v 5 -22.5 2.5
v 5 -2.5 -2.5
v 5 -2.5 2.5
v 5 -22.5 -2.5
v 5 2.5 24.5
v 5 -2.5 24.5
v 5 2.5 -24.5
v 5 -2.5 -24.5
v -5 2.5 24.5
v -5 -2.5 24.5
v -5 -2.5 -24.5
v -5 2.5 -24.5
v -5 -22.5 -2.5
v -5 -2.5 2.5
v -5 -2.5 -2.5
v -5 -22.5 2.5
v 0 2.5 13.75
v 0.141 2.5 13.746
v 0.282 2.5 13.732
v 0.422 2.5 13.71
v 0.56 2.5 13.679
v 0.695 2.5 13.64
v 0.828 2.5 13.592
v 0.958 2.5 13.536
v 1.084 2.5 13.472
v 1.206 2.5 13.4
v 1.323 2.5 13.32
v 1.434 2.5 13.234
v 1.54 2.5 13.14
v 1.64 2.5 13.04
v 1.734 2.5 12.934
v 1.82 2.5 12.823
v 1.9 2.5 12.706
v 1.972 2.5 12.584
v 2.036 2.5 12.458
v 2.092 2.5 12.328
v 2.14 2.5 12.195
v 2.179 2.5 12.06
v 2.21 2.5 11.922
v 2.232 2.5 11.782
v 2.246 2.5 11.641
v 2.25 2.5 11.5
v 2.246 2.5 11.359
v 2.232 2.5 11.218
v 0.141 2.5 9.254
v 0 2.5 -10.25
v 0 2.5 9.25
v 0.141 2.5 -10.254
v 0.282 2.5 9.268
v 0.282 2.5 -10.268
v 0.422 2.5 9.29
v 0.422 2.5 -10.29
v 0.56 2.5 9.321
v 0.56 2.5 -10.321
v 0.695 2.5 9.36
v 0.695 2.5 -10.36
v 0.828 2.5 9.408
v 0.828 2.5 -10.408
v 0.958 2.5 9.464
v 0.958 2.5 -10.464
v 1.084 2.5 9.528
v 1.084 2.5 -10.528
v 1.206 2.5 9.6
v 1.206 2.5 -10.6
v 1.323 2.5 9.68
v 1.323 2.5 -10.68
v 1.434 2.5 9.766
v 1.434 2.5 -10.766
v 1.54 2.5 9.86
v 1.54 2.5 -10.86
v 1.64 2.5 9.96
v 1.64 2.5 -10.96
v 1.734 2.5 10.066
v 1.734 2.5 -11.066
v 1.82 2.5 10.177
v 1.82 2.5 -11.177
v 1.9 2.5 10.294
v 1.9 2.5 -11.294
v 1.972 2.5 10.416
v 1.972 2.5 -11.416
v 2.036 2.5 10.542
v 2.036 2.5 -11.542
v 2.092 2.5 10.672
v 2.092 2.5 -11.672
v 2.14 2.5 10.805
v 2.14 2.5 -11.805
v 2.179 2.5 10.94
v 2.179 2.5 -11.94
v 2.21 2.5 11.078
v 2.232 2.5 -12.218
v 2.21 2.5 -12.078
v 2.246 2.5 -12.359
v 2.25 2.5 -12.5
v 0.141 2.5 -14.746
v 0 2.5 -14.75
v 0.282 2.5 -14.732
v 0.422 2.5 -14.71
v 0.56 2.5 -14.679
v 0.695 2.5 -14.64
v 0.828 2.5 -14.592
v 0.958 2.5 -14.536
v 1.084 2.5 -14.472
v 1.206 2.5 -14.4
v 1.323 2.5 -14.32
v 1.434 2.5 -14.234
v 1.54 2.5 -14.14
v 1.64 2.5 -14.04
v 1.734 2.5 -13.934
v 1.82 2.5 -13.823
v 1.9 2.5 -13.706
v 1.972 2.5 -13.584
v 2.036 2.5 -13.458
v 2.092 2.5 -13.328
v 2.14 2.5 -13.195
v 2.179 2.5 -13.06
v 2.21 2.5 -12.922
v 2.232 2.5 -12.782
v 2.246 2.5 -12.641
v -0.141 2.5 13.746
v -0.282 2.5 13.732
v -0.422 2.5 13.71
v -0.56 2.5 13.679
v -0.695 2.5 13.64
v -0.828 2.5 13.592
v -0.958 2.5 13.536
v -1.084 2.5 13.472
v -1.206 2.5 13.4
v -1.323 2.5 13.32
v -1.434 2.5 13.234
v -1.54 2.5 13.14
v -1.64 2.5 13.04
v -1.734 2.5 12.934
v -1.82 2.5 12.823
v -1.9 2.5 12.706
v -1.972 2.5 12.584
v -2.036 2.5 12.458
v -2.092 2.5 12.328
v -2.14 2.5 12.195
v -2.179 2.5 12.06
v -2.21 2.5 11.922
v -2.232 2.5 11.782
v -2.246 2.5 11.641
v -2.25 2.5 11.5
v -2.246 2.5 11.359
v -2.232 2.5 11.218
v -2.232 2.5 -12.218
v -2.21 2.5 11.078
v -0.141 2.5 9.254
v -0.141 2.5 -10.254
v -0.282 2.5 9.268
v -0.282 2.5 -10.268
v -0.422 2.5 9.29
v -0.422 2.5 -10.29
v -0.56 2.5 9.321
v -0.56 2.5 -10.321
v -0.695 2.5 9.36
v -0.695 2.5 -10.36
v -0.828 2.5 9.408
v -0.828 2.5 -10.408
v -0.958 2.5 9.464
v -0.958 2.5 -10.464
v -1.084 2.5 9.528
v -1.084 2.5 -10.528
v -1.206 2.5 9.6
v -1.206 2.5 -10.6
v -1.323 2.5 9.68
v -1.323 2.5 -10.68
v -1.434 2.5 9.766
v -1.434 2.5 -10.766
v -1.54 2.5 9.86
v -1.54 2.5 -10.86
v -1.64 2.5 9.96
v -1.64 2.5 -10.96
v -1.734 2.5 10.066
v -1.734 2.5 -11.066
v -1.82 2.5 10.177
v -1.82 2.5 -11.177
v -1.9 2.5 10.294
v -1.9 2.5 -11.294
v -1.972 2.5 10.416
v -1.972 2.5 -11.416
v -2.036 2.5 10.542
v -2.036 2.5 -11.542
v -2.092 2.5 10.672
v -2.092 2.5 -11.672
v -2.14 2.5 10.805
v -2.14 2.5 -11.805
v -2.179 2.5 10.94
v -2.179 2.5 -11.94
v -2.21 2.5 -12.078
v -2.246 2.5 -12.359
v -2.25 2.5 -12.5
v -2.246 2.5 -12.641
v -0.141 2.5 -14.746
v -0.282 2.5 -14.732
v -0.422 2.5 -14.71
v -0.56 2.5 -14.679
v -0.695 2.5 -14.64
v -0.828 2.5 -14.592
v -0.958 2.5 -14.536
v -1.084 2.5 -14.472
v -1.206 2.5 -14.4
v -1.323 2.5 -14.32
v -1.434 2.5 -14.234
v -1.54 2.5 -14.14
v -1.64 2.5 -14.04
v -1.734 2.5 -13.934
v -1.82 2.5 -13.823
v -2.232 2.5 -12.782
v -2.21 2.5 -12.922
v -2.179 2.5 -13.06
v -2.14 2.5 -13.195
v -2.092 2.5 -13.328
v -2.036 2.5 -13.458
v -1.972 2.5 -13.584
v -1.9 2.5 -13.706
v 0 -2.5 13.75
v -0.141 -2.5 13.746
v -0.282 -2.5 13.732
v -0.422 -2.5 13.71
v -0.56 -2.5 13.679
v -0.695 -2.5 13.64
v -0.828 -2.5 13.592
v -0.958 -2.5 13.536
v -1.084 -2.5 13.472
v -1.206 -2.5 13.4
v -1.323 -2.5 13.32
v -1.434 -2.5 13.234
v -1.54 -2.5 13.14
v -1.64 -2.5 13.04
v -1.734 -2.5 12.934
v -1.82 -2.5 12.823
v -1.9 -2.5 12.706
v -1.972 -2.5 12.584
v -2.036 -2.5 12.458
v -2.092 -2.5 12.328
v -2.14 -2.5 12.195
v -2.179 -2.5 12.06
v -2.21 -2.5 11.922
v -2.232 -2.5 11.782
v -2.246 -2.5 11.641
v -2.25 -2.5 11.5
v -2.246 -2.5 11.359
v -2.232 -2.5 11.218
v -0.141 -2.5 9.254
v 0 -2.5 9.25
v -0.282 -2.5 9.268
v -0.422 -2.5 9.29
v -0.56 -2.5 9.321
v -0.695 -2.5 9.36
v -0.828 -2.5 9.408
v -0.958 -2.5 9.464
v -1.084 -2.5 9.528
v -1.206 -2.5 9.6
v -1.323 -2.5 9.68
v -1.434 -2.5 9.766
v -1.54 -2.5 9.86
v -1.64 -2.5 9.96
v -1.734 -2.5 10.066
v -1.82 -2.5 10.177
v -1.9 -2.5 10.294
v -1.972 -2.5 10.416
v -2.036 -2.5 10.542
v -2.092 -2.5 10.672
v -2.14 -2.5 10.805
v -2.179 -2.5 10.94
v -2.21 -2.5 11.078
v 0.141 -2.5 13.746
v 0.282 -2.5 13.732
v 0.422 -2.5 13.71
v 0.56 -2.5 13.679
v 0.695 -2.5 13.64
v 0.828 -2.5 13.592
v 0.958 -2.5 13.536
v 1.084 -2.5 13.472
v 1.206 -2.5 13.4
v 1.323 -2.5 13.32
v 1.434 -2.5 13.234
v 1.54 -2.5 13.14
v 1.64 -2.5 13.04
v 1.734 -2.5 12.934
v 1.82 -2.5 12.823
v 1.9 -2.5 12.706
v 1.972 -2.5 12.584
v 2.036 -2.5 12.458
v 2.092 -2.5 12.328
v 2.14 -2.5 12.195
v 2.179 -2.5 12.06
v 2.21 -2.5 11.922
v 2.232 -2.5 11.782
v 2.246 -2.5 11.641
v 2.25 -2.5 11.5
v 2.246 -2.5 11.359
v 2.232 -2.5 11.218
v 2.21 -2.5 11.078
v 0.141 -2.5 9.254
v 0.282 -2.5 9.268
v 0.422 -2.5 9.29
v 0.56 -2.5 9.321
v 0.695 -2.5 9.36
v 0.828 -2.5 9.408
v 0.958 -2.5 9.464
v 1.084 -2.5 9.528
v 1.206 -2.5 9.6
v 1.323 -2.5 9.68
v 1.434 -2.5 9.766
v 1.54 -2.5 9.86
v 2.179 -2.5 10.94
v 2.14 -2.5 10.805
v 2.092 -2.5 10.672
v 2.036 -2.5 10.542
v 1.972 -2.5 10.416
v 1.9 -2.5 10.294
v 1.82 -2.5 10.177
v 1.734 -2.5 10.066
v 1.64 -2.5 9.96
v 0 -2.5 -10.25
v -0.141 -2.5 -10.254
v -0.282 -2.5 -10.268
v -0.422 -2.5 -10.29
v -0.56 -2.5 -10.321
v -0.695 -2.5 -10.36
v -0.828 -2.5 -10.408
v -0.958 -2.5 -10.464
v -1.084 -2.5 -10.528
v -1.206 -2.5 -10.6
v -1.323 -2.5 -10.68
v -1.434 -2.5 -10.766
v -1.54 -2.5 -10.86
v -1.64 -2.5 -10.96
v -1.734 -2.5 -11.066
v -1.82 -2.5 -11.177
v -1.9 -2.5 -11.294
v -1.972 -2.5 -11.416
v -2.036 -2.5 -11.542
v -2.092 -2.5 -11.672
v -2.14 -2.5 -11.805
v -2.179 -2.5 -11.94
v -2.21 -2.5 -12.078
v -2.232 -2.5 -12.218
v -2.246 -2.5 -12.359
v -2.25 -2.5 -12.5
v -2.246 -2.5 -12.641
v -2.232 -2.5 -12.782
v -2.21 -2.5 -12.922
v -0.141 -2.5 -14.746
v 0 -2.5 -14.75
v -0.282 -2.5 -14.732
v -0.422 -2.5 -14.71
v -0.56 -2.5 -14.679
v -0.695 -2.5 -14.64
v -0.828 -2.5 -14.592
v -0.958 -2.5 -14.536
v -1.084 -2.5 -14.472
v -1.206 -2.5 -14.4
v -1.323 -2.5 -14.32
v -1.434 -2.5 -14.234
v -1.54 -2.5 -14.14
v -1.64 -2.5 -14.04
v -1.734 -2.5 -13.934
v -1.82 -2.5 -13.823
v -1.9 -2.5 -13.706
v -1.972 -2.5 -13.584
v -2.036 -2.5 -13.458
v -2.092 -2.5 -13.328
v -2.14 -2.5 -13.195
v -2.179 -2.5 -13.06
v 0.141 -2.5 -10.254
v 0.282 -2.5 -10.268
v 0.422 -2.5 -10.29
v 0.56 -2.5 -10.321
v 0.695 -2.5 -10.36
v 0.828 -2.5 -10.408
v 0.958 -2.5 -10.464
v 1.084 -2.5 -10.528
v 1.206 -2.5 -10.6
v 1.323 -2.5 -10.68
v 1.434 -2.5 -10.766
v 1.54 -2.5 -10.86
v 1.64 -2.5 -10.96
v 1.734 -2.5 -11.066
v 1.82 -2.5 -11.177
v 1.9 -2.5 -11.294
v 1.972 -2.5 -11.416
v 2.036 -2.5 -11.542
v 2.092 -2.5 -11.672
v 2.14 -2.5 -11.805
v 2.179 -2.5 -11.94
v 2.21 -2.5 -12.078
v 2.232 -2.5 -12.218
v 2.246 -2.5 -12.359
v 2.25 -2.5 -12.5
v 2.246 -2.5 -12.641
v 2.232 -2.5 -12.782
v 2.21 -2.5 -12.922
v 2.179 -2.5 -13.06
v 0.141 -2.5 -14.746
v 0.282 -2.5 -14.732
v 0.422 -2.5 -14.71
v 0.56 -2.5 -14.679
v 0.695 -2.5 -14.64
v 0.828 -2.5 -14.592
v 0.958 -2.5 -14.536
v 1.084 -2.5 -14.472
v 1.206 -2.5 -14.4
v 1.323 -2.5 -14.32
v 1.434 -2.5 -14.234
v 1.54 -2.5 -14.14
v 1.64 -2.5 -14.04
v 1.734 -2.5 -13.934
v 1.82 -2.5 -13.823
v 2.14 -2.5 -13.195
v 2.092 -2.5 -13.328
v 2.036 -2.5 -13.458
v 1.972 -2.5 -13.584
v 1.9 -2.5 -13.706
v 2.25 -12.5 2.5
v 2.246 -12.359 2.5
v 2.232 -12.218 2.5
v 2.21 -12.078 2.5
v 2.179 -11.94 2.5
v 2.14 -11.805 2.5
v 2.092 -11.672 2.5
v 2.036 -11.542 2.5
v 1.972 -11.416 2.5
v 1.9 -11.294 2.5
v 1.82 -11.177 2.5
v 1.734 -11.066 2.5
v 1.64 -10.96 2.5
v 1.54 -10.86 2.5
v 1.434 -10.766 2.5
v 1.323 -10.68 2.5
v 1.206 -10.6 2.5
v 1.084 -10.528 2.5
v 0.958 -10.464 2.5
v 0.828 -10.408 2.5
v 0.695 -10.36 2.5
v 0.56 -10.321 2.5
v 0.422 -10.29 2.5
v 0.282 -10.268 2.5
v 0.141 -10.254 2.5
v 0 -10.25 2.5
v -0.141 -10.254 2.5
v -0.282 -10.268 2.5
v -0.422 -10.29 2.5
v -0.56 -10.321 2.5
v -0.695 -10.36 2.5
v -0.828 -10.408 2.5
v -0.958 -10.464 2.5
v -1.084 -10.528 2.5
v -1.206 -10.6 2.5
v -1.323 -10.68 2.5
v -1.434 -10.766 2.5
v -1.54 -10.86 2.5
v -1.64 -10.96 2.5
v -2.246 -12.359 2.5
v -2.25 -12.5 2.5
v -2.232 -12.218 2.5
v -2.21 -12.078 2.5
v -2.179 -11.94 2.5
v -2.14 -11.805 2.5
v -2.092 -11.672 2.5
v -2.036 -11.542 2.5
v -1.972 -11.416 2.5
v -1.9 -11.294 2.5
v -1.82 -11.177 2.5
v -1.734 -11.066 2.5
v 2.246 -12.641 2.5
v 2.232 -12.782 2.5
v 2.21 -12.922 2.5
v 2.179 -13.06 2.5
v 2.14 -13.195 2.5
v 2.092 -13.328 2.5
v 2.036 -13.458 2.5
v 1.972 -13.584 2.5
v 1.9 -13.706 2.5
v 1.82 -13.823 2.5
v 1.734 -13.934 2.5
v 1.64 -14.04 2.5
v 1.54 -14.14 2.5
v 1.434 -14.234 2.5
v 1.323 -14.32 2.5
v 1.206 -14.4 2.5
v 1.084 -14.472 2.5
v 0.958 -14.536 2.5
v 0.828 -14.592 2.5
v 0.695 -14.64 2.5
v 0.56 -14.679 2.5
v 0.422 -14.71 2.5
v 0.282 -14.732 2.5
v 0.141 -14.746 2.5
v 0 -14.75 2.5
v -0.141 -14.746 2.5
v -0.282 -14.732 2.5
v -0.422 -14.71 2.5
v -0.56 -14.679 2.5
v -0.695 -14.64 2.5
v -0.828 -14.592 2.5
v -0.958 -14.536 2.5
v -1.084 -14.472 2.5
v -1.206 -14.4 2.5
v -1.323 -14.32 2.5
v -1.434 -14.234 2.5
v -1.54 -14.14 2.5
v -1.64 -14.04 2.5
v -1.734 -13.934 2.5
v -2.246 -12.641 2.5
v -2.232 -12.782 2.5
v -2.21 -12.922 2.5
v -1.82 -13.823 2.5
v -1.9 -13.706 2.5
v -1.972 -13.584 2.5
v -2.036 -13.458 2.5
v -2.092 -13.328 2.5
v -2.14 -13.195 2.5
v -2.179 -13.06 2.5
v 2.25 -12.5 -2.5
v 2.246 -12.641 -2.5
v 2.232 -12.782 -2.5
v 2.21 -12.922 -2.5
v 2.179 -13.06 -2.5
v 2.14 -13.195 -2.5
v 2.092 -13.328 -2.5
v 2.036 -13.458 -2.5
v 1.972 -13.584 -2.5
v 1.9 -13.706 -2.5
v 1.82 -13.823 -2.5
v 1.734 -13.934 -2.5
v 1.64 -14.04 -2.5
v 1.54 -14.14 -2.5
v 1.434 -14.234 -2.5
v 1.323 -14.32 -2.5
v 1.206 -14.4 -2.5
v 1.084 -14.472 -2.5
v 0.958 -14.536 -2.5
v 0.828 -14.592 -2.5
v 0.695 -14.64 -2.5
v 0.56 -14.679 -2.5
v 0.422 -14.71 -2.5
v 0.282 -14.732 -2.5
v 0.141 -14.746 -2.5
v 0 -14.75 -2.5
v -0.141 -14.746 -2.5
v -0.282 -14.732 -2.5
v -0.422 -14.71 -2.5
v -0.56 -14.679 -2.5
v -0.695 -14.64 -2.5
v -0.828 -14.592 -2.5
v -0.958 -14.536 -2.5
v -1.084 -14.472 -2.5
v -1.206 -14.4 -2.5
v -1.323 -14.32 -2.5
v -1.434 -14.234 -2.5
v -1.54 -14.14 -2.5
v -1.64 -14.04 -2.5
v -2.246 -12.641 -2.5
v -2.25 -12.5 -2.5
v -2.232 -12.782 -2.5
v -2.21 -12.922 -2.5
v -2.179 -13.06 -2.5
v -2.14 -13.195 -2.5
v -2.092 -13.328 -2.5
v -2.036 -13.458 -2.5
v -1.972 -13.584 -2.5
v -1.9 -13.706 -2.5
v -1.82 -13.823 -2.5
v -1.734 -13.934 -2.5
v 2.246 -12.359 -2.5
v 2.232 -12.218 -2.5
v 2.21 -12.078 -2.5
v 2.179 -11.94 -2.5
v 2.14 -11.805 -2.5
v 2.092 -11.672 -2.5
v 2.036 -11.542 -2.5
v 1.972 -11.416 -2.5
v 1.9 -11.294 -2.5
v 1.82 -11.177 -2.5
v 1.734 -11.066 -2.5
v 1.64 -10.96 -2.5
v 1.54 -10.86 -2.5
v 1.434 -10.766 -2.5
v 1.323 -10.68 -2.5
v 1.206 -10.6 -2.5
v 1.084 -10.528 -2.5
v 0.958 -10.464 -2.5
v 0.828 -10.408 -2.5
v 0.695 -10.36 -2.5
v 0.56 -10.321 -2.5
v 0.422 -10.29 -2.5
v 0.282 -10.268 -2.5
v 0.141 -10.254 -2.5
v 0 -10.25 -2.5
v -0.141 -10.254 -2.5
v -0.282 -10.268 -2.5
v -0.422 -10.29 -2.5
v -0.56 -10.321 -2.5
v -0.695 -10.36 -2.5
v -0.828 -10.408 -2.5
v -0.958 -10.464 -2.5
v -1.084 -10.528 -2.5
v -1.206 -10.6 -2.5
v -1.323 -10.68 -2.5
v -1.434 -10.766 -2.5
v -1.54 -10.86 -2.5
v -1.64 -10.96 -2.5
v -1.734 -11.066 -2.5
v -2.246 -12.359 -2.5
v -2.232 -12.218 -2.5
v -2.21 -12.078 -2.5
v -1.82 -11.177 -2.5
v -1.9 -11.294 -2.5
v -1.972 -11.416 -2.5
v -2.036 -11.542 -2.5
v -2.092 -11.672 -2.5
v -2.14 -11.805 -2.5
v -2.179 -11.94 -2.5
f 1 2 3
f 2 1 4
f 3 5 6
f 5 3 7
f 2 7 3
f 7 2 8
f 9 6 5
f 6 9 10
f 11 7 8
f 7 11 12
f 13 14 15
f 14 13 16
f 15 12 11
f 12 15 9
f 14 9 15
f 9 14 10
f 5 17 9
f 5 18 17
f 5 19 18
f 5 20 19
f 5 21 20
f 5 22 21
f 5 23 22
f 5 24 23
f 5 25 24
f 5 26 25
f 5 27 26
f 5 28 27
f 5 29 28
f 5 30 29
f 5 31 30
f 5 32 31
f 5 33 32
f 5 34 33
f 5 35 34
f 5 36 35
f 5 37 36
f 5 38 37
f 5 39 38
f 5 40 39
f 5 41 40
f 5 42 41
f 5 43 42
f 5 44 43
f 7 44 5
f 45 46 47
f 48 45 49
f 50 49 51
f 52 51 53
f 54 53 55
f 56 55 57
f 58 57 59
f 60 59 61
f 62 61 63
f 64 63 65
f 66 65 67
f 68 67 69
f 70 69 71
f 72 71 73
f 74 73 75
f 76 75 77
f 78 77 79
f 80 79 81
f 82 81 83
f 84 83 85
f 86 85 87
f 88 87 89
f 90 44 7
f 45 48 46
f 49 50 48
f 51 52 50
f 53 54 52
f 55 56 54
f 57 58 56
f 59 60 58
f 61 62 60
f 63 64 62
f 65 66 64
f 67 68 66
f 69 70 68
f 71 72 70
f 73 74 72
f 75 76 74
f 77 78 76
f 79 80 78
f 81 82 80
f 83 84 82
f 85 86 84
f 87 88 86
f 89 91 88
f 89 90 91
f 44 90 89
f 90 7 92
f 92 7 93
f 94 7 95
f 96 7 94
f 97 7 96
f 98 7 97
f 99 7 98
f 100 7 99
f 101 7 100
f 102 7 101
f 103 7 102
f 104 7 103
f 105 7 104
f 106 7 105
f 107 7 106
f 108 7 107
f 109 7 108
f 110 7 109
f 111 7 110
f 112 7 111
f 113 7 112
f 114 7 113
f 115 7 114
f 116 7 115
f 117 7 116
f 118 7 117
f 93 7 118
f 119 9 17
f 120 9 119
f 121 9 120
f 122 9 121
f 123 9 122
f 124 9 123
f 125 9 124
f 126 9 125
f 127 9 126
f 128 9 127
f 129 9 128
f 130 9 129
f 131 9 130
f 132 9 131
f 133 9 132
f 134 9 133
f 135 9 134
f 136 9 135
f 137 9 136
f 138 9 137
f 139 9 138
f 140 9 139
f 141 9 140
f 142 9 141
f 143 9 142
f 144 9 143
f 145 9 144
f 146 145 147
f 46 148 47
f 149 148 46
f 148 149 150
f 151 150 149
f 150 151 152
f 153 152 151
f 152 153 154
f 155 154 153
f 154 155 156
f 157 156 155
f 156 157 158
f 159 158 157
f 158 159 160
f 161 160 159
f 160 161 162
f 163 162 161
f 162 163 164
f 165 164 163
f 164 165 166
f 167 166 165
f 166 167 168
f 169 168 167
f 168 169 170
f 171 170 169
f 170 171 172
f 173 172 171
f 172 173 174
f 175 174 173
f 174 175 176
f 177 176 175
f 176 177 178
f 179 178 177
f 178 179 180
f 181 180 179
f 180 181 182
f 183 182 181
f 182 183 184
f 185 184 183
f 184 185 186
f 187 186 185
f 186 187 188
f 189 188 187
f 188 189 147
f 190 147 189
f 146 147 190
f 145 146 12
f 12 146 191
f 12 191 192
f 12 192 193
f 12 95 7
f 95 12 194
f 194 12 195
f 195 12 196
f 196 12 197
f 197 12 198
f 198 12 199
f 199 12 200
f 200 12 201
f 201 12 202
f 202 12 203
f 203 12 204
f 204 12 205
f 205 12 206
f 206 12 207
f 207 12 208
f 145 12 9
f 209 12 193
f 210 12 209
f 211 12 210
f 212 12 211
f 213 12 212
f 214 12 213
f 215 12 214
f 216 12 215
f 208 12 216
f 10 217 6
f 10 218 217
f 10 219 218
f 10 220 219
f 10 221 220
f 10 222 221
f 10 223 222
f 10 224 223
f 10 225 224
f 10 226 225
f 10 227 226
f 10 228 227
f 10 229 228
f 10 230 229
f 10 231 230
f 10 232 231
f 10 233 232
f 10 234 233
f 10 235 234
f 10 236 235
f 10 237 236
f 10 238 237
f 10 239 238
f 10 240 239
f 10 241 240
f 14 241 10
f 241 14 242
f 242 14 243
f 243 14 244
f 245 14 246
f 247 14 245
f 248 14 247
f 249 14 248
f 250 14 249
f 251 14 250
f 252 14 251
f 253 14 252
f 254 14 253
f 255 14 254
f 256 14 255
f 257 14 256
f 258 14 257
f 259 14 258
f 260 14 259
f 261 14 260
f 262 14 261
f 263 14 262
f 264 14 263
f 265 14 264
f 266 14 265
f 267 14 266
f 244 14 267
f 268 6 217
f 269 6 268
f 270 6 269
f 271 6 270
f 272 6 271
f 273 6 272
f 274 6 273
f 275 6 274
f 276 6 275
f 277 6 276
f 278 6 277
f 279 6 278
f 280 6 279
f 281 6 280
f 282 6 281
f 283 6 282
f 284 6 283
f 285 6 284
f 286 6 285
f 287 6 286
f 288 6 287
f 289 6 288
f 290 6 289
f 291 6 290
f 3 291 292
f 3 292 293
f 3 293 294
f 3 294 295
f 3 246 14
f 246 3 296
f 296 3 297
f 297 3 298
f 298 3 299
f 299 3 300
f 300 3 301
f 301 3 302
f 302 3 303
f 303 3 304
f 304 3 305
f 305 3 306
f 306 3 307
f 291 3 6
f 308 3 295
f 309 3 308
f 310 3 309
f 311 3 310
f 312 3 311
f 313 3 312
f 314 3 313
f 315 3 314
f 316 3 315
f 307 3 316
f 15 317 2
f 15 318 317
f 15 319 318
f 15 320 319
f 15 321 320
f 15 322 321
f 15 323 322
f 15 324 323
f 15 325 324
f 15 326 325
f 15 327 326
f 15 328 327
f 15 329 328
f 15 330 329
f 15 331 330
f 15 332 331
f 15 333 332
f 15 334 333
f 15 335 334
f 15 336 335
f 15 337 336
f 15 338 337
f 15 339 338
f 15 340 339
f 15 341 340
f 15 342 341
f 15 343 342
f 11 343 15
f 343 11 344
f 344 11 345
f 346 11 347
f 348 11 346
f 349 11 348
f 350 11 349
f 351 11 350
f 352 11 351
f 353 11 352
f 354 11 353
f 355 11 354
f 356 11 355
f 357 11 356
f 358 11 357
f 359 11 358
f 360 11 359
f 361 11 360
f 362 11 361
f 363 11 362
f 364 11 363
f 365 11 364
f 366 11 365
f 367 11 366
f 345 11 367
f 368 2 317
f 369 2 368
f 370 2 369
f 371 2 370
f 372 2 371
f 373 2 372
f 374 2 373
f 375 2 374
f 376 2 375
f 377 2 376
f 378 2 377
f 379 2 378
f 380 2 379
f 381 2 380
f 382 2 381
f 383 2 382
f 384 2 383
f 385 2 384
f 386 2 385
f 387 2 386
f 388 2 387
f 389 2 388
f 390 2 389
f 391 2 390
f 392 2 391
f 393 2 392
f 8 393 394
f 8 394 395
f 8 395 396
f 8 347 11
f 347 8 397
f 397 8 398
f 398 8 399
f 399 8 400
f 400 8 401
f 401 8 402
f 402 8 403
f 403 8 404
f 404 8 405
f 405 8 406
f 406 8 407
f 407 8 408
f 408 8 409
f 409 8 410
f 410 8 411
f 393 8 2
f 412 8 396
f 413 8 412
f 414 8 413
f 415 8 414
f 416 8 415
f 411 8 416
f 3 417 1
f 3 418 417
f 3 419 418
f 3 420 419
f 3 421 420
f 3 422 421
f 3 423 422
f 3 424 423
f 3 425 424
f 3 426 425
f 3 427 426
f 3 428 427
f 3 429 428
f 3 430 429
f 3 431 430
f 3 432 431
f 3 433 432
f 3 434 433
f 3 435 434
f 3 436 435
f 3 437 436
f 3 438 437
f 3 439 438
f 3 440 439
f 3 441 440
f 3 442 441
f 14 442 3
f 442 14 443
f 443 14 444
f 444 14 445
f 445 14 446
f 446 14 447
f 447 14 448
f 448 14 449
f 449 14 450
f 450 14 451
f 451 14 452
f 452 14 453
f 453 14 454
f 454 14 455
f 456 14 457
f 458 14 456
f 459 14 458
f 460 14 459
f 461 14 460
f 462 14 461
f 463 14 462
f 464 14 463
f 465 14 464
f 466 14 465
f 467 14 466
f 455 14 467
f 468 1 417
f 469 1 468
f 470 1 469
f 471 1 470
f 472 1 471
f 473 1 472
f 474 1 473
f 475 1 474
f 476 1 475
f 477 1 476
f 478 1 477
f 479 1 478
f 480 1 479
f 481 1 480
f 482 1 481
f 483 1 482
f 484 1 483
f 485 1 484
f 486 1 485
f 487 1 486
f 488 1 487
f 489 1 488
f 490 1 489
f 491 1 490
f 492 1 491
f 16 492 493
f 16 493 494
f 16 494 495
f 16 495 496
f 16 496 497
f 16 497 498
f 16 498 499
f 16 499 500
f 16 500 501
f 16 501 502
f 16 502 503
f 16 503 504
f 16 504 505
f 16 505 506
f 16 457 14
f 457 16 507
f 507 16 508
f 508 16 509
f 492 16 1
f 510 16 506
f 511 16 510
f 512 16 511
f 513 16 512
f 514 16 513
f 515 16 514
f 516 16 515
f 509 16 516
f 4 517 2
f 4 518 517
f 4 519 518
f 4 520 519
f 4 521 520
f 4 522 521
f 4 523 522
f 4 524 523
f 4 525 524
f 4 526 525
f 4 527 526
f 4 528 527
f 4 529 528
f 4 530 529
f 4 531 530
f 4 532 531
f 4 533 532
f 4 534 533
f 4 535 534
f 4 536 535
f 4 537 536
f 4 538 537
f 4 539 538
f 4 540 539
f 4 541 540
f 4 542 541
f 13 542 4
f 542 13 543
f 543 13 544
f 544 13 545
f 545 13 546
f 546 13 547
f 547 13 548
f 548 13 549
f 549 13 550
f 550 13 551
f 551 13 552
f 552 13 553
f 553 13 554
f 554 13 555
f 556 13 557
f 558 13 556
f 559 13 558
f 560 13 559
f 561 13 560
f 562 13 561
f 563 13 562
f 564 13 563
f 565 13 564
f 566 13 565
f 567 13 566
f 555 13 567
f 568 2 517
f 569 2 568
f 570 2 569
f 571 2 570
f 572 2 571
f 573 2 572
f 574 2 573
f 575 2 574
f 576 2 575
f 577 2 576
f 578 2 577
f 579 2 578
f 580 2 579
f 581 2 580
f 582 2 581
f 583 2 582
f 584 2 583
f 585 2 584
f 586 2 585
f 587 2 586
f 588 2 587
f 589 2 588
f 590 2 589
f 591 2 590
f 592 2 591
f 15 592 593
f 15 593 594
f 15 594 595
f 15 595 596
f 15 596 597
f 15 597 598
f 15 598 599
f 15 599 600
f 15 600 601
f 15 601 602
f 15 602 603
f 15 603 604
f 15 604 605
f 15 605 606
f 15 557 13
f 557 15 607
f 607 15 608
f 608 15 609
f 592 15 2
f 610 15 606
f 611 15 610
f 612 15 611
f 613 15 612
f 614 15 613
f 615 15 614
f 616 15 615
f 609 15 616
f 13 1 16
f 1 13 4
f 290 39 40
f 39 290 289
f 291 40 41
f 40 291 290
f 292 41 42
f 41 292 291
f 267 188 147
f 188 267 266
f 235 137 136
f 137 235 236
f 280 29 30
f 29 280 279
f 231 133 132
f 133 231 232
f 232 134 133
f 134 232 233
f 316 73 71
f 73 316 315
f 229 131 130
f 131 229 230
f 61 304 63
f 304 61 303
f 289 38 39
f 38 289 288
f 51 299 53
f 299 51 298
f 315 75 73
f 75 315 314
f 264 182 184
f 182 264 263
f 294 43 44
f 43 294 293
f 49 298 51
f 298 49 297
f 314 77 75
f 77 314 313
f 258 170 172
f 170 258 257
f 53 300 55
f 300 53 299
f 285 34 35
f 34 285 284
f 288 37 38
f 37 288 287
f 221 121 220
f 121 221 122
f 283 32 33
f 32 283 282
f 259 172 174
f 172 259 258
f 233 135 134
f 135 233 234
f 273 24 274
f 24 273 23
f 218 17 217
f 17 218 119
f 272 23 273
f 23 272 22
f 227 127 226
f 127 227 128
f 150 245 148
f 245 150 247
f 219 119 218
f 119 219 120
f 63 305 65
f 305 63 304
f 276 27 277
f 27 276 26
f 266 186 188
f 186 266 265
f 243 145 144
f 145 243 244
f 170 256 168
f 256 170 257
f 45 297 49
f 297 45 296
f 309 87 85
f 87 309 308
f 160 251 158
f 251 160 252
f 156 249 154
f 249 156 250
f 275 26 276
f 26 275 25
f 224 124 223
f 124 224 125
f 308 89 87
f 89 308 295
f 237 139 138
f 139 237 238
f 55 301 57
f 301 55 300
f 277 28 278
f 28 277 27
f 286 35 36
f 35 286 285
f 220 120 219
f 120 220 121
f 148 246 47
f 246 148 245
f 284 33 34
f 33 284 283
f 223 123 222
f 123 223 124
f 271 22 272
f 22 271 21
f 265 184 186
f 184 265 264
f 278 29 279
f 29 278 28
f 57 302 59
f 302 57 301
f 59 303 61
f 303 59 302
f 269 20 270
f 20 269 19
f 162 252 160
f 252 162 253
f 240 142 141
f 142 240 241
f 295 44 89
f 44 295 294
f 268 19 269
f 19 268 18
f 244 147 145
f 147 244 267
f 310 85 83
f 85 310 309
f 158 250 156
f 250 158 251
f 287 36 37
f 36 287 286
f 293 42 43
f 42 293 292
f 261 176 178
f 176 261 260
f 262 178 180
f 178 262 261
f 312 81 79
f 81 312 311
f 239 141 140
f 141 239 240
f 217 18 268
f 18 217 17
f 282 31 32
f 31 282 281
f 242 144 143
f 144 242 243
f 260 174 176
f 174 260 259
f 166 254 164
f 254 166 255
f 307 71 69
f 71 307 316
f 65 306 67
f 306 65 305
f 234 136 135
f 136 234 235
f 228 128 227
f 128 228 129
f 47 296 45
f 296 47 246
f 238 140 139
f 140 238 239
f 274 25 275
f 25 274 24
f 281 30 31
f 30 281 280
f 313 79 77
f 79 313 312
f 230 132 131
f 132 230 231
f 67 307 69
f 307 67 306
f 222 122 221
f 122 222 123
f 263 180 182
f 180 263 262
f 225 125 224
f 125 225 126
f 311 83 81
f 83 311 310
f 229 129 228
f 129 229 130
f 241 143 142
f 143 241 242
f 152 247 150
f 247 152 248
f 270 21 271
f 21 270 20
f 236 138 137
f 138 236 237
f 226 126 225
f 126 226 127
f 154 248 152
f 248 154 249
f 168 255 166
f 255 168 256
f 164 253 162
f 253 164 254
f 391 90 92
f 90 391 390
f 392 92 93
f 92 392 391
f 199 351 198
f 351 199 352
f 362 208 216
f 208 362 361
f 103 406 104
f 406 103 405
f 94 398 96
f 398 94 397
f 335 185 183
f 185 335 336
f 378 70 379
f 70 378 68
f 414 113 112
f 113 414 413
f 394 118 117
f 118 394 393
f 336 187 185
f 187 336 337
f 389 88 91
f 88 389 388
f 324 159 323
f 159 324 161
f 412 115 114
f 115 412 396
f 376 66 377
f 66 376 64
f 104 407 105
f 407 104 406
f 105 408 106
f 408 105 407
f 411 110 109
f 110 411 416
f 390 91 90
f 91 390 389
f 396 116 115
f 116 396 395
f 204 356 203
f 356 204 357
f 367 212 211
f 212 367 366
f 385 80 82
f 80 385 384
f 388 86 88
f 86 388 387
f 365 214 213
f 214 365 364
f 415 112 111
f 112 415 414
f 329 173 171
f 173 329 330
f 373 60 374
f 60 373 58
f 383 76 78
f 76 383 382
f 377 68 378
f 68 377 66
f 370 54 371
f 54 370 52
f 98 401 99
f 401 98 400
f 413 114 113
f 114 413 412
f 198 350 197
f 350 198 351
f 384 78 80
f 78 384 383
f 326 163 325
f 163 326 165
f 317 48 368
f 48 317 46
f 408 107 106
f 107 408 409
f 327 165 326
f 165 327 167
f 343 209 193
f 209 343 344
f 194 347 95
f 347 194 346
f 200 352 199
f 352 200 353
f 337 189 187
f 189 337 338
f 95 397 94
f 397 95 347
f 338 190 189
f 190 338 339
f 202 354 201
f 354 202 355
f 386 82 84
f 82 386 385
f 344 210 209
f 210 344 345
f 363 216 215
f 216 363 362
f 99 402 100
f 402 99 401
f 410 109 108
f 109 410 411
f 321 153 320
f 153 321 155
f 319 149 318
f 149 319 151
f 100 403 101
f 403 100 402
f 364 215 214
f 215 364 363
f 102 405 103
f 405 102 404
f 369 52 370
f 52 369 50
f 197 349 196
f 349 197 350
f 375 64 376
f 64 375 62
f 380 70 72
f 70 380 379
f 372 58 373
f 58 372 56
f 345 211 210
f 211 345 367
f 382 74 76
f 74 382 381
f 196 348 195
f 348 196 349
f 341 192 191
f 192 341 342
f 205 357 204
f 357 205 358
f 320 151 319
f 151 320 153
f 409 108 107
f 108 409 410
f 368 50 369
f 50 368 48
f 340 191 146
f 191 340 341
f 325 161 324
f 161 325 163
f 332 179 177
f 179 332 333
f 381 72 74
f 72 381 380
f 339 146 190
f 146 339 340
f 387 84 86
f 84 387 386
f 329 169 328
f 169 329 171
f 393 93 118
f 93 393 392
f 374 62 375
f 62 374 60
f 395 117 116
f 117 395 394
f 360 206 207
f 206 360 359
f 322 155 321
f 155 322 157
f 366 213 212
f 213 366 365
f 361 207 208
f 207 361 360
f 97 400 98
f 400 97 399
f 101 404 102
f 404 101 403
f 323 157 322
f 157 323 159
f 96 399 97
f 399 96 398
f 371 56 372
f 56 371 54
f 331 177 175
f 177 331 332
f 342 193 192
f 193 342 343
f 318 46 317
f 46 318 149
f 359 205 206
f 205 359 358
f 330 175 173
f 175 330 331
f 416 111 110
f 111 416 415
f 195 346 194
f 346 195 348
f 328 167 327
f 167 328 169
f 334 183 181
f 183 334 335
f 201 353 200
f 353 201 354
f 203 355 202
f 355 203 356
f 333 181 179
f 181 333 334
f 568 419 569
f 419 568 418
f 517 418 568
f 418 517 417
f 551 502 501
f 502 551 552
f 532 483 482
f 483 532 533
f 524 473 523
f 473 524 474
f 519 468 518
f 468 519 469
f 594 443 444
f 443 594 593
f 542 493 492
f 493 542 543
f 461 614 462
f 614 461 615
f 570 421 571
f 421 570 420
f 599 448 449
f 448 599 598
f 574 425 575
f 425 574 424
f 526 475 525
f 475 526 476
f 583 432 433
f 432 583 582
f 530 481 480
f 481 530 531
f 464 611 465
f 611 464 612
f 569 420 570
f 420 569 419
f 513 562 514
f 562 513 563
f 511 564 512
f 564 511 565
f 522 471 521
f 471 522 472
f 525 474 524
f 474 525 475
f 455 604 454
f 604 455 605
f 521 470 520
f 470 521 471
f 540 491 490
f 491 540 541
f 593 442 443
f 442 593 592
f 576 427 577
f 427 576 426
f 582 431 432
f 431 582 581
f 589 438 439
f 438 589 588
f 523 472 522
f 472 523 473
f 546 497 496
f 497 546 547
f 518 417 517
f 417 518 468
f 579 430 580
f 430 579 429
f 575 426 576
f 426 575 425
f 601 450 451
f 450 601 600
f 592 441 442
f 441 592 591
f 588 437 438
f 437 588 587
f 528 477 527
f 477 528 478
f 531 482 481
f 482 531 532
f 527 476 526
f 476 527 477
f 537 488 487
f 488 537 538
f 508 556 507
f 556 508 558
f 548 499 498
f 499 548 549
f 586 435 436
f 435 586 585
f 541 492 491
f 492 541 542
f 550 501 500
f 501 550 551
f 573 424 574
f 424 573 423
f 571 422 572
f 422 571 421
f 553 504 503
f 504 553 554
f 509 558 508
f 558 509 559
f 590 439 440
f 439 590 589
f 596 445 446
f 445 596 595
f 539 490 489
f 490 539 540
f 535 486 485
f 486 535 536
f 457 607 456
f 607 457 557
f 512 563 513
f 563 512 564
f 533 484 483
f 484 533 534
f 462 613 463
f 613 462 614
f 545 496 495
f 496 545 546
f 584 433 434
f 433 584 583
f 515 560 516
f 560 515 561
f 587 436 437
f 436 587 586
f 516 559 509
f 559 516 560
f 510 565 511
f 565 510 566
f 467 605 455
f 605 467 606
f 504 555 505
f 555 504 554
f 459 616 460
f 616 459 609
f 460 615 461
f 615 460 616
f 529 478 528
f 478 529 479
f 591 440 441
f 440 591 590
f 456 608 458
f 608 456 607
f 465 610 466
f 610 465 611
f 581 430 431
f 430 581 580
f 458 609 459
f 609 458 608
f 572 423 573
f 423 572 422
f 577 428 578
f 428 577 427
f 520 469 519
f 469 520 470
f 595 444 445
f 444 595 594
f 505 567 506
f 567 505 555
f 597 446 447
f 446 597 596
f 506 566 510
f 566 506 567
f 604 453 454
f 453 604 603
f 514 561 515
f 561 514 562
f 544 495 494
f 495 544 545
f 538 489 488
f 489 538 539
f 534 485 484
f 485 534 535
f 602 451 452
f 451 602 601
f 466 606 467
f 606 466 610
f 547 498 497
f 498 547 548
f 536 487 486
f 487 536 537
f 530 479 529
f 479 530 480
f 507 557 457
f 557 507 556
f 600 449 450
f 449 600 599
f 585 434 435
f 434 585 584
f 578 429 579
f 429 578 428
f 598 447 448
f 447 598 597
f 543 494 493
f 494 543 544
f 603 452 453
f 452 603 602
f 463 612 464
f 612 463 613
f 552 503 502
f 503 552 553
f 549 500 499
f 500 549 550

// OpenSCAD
// file: 2020_extrusion.scad
/* Global */
include <vars.scad>;

/* ========================================================= */
/* MODULES                                                   */
/* ========================================================= */

module 2020_extrusion(bar_height){
    small=0.001;

    translate([0,0,0])
    intersection(){
        cylinder(d=26.87,h=bar_height,center=true, $fn=200);
        difference(){
            union(){
                difference(){
                cube([20,20,bar_height],center=true);
                    union()
                    {
                        cube([16.4+small,16.4+small,bar_height+small],center=true);
                        cube([6.2+small,20+small,bar_height+small],center=true);
                        cube([20+small,6.2+small,bar_height+small],center=true);

                        translate([0,9.75,0])
                        cube([7.2+small,0.5+small,bar_height+small],center=true);
                        translate([9.75+small,0,0])
                        cube([0.5+small,7.2+small,bar_height+small],center=true);
                        translate([0,-9.75-small,0])
                        cube([7.2+small,0.5+small,bar_height+small],center=true);
                        translate([-9.75-small,0,0])
                        cube([0.5+small,7.2+small,bar_height+small],center=true);
                    }

                }
                rotate([0,0,45]){
                    cube([1.5,26,bar_height],center=true);
                    cube([26,1.5,bar_height],center=true);
                }
                translate([7.5,7.5,0])cube([4.5,4.5,bar_height],center=true);
                translate([-7.5,-7.5,0])cube([4.5,4.5,bar_height],center=true);
                translate([-7.5,7.5,0])cube([4.5,4.5,bar_height],center=true);
                translate([7.5,-7.5,0])cube([4.5,4.5,bar_height],center=true);
                cube([8,8,bar_height],center=true);
            }
            cylinder(r=2.5,h=bar_height+small,center=true, $fn=200);
        }
}
}
// file: vars.scad
/* Makefile needs */
PART = "none";
IMAGE = "none";

/* frame */
height = 690;
width = 500;
depth = 500;

frame_size = 20;
frame_half = frame_size / 2;

glass_height = 3;
glass_width = 400;
glass_depth = 400;

rail_diam = 10;
z_rail_width = 60;
z_carriage_width = z_rail_width + frame_size;

// Sources for Metric fastener dimensions
// http://www.carbidedepot.com/formulas-tap-metric.htm
// http://www.roymech.co.uk/Useful_Tables/Screws/cap_screws.htm
// https://www.fairburyfastener.com/xdims_metric_nuts.htm

// M5
M5_bolt_diam = 5;
M5_bolt_hole = 5.5;
M5_nut_height = 4;
M5_nut_width = 7.9;
M5_nut_diam = 9;

// M4
M4_bolt_diam = 4;
M4_bolt_hole = 4.5;
M4_nut_height = 3.5;
M4_nut_width = 6.9;
M4_nut_diam = 8;


//608zz
608zz_height=7;
608zz_od=22;
608zz_id=8;
608zz_race=11;



// Height adjustment
pivot_diam=12;
height_bolt_diam=M4_bolt_diam;
// main file
/*
 *
 * The parts in this file are:
 *
 *   - 2020_ps_mount()
 *     This connects the z carriage to the build plate frame
 *
 *
 * Copyright 2019 Tim Schaller
 * All rights reserved
 * Released under the GPL3
 * No claims are made as to the fitness and/or corectness of
 * this work. Use at your own risk. If you create useless things,
 * or if the parts fail it is on you NOT ME. As far as I know
 * this might make your printer burst into flames or print
 * little pink bunnies. You call. };->
 *
 */

include <vars.scad>;
include <2020_extrusion.scad>;


PART = "2020_ps_mount";
size=120;

if (PART == "2020_ps_mount") {
  color("skyblue")
  2020_ps_mount();

//  color("green", 0.5)
//  translate([0,-12.5,-12.5]) rotate([0,90,0]) 2020_extrusion(40);
}

/* ========================================================= */
/* MODULES                                                   */
/* ========================================================= */

module 2020_ps_mount() {
  difference() {
    union() {
      cube([10, 5, 49], center=true);
      translate([0, -10, 0]) cube(size=[10, 25, 5], center=true);
    }
    translate([0, 0, 11.5]) rotate([90, 0, 0]) cylinder(h=6, d=4.5, $fn=100, center=true);
    translate([0, 0,-12.5]) rotate([90, 0, 0]) cylinder(h=6, d=4.5, $fn=100, center=true);
    translate([0,-12.5, 0]) rotate([ 0, 0, 0]) cylinder(h=6, d=4.5, $fn=100, center=true);
  }
}
